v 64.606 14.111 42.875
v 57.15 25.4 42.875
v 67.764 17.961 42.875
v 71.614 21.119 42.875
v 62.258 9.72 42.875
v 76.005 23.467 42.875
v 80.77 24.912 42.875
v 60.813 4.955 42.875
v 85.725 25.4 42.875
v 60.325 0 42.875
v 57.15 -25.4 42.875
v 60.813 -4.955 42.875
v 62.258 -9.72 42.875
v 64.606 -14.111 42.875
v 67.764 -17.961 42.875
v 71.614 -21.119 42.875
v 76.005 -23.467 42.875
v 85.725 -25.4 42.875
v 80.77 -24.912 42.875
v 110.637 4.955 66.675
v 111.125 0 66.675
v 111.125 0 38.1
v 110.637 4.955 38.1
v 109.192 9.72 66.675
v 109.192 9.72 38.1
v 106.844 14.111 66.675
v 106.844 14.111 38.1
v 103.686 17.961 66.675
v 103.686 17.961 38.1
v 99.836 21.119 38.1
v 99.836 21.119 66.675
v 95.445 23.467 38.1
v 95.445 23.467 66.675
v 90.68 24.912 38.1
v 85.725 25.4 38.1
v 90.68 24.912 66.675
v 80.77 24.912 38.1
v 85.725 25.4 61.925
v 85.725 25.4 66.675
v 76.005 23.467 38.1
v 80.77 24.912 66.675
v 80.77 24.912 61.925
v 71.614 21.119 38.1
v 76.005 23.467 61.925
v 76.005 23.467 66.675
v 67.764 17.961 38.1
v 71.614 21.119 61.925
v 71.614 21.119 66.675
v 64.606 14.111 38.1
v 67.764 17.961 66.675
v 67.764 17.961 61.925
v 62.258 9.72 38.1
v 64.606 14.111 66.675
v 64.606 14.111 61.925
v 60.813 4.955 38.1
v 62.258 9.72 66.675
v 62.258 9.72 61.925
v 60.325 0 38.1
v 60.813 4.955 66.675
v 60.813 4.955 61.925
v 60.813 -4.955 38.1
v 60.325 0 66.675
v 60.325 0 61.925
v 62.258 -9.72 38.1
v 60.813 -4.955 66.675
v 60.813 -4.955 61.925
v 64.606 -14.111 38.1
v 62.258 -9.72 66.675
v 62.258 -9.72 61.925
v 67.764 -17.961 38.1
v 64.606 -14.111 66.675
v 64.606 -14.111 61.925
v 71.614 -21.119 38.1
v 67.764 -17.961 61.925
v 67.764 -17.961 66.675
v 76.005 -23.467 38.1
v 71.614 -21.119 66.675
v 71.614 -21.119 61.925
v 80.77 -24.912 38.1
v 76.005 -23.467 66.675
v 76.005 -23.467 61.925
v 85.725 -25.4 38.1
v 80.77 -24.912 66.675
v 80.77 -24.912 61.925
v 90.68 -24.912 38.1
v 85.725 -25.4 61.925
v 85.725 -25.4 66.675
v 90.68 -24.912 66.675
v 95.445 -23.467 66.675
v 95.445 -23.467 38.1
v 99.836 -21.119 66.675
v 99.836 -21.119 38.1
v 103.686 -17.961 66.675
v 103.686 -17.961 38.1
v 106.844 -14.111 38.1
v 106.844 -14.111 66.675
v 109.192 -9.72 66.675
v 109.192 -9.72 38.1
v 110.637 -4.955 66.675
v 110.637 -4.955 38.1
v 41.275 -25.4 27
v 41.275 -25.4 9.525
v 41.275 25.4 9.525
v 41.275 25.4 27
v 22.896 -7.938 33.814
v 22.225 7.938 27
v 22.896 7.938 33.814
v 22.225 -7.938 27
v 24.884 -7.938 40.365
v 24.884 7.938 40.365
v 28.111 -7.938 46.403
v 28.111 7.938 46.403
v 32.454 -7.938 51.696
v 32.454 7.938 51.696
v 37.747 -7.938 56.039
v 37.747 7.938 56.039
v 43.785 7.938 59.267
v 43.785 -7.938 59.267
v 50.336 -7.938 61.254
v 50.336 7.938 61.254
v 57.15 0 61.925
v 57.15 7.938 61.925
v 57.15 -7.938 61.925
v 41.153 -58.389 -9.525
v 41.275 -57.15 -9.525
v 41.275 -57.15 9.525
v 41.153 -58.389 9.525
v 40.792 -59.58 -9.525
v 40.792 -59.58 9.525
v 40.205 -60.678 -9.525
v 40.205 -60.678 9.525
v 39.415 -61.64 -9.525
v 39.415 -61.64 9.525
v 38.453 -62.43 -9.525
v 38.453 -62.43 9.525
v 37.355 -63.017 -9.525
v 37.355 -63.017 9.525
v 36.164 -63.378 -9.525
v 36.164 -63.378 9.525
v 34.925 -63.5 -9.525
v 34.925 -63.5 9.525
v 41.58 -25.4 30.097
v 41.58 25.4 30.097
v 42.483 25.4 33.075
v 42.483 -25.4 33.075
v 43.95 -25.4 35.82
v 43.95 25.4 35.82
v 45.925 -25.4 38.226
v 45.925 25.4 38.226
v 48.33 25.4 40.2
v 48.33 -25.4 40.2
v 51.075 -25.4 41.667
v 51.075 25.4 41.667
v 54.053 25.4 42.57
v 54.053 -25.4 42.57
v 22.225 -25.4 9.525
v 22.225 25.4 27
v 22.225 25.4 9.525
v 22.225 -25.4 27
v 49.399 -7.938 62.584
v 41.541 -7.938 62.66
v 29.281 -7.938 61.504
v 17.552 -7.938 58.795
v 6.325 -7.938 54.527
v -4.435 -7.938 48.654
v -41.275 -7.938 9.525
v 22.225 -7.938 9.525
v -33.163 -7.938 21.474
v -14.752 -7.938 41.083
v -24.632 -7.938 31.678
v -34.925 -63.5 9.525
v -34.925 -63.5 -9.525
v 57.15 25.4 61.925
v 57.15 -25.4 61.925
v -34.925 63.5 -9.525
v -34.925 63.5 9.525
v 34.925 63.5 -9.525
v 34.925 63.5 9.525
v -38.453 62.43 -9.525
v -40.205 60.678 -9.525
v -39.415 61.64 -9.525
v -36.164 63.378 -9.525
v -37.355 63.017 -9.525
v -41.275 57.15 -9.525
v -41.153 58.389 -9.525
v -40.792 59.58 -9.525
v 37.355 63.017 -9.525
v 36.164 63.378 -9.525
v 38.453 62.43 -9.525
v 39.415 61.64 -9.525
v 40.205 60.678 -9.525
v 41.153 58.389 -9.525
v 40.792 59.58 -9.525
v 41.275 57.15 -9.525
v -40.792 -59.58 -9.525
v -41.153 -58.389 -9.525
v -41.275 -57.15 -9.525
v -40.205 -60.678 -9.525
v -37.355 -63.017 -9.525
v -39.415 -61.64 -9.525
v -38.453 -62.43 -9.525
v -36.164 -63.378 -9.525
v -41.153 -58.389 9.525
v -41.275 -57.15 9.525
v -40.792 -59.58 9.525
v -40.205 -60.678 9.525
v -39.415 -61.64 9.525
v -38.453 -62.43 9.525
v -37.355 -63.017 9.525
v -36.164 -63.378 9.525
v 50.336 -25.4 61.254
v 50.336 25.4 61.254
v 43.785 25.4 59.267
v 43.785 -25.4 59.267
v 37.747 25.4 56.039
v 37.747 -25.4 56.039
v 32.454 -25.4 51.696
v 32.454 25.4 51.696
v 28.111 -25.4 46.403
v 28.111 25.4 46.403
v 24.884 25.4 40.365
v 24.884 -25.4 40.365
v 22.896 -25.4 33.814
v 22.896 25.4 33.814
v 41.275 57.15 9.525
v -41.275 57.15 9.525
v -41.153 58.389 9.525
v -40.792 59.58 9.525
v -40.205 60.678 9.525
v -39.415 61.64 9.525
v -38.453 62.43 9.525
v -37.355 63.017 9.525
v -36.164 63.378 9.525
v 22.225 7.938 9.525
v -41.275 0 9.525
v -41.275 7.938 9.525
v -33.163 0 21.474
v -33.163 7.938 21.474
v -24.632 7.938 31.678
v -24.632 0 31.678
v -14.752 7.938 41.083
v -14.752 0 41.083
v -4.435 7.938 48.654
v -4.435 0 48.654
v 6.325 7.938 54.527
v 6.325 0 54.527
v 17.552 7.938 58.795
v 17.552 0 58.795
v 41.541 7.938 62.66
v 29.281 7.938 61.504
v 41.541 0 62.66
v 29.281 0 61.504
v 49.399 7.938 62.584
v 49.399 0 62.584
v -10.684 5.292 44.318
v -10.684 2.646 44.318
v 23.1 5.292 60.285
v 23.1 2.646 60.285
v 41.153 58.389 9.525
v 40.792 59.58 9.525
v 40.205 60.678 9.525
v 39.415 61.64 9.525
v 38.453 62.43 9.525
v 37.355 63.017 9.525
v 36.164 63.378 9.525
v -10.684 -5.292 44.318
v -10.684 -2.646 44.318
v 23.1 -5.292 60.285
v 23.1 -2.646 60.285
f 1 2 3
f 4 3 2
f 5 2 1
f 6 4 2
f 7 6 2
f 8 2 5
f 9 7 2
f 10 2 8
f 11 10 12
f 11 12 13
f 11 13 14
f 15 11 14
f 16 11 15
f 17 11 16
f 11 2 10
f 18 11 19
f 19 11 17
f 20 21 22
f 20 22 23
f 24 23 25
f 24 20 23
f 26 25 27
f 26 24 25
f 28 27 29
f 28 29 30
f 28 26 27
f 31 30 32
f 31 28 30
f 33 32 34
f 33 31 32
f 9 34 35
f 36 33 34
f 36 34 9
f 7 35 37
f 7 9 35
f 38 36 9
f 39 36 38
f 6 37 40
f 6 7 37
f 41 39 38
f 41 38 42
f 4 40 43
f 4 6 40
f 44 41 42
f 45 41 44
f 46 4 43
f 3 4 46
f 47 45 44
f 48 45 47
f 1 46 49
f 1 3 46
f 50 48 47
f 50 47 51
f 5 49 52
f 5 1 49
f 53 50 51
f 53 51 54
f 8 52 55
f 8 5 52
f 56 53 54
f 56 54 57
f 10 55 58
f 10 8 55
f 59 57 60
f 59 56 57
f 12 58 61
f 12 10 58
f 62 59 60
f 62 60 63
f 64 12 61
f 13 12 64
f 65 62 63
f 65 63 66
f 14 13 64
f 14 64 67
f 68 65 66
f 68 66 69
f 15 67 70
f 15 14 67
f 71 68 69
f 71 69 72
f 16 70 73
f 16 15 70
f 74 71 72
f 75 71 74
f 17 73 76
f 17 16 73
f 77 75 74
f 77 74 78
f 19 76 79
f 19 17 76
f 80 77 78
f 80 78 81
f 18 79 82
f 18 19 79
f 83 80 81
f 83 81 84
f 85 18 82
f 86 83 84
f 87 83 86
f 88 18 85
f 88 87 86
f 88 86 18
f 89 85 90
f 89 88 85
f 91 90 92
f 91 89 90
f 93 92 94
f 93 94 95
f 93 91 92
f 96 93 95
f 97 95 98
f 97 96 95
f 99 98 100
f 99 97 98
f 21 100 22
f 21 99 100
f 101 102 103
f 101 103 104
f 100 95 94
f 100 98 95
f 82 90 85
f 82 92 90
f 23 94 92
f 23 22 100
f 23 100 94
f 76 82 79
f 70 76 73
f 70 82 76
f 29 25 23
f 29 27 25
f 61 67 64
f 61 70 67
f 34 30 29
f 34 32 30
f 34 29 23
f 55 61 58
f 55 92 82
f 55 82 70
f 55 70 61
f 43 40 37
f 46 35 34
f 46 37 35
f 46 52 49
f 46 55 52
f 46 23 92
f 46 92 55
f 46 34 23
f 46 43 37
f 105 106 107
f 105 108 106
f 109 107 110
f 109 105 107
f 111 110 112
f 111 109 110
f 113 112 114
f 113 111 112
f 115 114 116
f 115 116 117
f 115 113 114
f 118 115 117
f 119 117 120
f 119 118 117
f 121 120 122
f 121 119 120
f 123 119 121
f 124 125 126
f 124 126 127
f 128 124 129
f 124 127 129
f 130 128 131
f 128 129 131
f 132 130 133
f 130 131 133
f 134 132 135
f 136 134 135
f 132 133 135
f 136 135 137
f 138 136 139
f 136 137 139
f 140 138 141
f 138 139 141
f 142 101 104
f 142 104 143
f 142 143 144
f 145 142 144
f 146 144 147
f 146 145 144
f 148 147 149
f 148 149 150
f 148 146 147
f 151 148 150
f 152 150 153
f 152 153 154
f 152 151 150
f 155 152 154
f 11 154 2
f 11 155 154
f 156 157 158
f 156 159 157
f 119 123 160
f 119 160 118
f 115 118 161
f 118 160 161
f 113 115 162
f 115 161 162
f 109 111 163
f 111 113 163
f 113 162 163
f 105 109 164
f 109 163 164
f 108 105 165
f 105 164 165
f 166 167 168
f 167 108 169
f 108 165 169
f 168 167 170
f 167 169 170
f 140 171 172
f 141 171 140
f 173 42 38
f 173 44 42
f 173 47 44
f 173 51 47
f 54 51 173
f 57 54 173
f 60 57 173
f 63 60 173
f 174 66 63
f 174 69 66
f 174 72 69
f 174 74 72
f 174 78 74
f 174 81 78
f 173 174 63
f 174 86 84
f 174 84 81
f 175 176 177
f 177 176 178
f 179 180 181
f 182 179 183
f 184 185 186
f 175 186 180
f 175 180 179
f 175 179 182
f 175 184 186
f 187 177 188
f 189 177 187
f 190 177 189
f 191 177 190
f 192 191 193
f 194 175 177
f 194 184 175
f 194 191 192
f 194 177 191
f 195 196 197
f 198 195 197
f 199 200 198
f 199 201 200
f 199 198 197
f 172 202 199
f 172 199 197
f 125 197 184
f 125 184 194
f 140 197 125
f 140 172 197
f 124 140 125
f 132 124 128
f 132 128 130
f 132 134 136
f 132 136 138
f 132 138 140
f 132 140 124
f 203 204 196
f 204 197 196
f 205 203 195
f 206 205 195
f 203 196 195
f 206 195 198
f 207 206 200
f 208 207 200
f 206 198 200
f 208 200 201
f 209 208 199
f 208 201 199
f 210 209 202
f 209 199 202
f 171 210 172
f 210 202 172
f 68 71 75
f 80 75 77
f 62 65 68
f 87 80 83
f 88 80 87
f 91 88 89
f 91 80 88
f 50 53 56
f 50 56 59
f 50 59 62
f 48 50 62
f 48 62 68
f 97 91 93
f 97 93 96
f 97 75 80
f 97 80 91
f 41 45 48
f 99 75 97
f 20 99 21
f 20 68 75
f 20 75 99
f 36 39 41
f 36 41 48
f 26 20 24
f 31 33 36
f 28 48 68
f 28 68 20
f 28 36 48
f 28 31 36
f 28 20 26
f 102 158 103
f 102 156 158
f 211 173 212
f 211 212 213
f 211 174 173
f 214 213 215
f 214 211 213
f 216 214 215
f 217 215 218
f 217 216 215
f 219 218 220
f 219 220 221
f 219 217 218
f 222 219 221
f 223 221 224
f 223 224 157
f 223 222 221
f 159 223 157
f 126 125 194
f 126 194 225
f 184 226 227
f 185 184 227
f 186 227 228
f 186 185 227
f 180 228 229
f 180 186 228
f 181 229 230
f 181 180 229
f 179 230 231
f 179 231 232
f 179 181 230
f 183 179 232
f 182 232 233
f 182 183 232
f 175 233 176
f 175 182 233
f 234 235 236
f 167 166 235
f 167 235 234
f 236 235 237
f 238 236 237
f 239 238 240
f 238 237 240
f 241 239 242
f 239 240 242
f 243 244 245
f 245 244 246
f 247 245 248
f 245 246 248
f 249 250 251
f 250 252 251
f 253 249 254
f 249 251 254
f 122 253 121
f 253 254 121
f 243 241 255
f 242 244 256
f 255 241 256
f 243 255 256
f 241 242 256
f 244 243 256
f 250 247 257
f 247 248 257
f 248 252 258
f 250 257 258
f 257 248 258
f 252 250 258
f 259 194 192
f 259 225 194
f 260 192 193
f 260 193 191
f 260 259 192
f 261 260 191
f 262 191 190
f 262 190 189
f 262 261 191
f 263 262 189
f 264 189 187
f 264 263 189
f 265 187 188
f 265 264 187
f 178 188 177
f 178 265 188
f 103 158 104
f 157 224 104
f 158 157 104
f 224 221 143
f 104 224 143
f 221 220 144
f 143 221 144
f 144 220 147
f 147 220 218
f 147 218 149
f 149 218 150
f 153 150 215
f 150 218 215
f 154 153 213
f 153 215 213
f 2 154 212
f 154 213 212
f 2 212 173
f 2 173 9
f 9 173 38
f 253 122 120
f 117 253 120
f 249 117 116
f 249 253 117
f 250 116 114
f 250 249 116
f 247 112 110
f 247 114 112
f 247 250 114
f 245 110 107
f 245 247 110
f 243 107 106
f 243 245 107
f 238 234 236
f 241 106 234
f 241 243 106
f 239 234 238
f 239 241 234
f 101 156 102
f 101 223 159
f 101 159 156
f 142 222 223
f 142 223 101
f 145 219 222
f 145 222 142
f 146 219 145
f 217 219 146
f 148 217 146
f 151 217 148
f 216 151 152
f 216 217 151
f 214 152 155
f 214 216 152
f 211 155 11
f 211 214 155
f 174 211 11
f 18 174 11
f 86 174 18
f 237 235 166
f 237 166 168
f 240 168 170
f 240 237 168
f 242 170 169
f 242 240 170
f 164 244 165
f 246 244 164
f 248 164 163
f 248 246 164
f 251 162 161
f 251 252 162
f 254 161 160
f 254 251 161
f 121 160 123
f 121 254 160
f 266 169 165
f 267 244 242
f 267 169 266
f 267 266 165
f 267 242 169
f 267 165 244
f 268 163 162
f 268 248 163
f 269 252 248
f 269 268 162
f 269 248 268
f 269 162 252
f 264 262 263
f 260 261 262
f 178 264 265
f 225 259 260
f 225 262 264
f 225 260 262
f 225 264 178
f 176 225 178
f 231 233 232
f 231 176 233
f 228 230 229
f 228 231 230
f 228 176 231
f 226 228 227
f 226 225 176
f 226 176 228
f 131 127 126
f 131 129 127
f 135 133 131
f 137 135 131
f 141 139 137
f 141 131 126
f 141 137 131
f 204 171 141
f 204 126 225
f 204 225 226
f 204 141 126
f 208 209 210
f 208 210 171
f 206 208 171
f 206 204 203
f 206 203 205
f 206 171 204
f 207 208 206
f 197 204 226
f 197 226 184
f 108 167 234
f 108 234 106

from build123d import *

# Parameters (mm, degrees)
F1_DEPTH = 63.5
F0_W     = 25.4
F0_H     = 19.05
F2_DEPTH = 25.4
F4_R     = 6.35
F5_DEPTH = 7.9375


with BuildPart() as f1:
    # F0 (on Front) → F1 (new body, symmetric)
    with BuildSketch(Plane.XZ):
        Polygon((-41.275, 9.525), (-41.275, -9.525), (41.275, -9.525), (41.275, 9.525), (22.225, 9.525), align=None)
    extrude(amount=F1_DEPTH, both=True)

    # F4
    f4_edges = [f1.edges().sort_by_distance(p)[0] for p in [
        (41.275, -63.5, 0),
        (-41.275, -63.5, 0),
        (41.275, 63.5, 0),
        (-41.275, 63.5, 0),
    ]]
    fillet(f4_edges, radius=F4_R)


with BuildPart() as f2:
    # F0 (on Front) → F2 (new body, symmetric)
    with BuildSketch(Plane.XZ):
        with BuildLine():
            Line((22.225, 9.525), (41.275, 9.525))
            Line((41.275, 9.525), (41.275, 27.0002))
            ThreePointArc((41.275, 27.0002), (45.9246798487, 38.2255201513), (57.15, 42.8752))
            Line((57.15, 42.8752), (60.325, 42.8752))
            Line((60.325, 42.8752), (60.325, 61.9252))
            Line((60.325, 61.9252), (57.15, 61.9252))
            ThreePointArc((57.15, 61.9252), (32.4542956671, 51.6959043329), (22.225, 27.0002))
            Line((22.225, 27.0002), (22.225, 9.525))
        make_face()
        with Locations((73.025, 52.4002)):
            Rectangle(F0_W, F0_H)
    extrude(amount=F2_DEPTH, both=True)

    # F0 (on Front) → F3 (revolve)
    with BuildSketch(Plane.XZ):
        Polygon((85.725, 66.675), (85.725, 61.9252), (85.725, 42.8752), (85.725, 38.1), (111.125, 38.1), (111.125, 66.675), align=None)
    revolve(axis=Axis((85.725, 0, 52.3875), (0, 0, 1)))


with BuildPart() as f5:
    # F0 (on Front) → F5 (new body, symmetric)
    with BuildSketch(Plane.XZ):
        with BuildLine():
            add(Edge.make_bspline(
                [(-41.275, 9.525), (-13.2558885962, 55.2299320698), (23.9428803325, 65.9482255578), (57.15, 61.9252)],
                knots=[0, 0, 0, 0, 111.5045361635, 111.5045361635, 111.5045361635, 111.5045361635], degree=3))
            Line((-41.275, 9.525), (22.225, 9.525))
            Line((22.225, 9.525), (22.225, 27.0002))
            ThreePointArc((22.225, 27.0002), (32.4542956671, 51.6959043329), (57.15, 61.9252))
        make_face()
    extrude(amount=F5_DEPTH, both=True)


solid = Compound([f1.part, f2.part, f5.part])
